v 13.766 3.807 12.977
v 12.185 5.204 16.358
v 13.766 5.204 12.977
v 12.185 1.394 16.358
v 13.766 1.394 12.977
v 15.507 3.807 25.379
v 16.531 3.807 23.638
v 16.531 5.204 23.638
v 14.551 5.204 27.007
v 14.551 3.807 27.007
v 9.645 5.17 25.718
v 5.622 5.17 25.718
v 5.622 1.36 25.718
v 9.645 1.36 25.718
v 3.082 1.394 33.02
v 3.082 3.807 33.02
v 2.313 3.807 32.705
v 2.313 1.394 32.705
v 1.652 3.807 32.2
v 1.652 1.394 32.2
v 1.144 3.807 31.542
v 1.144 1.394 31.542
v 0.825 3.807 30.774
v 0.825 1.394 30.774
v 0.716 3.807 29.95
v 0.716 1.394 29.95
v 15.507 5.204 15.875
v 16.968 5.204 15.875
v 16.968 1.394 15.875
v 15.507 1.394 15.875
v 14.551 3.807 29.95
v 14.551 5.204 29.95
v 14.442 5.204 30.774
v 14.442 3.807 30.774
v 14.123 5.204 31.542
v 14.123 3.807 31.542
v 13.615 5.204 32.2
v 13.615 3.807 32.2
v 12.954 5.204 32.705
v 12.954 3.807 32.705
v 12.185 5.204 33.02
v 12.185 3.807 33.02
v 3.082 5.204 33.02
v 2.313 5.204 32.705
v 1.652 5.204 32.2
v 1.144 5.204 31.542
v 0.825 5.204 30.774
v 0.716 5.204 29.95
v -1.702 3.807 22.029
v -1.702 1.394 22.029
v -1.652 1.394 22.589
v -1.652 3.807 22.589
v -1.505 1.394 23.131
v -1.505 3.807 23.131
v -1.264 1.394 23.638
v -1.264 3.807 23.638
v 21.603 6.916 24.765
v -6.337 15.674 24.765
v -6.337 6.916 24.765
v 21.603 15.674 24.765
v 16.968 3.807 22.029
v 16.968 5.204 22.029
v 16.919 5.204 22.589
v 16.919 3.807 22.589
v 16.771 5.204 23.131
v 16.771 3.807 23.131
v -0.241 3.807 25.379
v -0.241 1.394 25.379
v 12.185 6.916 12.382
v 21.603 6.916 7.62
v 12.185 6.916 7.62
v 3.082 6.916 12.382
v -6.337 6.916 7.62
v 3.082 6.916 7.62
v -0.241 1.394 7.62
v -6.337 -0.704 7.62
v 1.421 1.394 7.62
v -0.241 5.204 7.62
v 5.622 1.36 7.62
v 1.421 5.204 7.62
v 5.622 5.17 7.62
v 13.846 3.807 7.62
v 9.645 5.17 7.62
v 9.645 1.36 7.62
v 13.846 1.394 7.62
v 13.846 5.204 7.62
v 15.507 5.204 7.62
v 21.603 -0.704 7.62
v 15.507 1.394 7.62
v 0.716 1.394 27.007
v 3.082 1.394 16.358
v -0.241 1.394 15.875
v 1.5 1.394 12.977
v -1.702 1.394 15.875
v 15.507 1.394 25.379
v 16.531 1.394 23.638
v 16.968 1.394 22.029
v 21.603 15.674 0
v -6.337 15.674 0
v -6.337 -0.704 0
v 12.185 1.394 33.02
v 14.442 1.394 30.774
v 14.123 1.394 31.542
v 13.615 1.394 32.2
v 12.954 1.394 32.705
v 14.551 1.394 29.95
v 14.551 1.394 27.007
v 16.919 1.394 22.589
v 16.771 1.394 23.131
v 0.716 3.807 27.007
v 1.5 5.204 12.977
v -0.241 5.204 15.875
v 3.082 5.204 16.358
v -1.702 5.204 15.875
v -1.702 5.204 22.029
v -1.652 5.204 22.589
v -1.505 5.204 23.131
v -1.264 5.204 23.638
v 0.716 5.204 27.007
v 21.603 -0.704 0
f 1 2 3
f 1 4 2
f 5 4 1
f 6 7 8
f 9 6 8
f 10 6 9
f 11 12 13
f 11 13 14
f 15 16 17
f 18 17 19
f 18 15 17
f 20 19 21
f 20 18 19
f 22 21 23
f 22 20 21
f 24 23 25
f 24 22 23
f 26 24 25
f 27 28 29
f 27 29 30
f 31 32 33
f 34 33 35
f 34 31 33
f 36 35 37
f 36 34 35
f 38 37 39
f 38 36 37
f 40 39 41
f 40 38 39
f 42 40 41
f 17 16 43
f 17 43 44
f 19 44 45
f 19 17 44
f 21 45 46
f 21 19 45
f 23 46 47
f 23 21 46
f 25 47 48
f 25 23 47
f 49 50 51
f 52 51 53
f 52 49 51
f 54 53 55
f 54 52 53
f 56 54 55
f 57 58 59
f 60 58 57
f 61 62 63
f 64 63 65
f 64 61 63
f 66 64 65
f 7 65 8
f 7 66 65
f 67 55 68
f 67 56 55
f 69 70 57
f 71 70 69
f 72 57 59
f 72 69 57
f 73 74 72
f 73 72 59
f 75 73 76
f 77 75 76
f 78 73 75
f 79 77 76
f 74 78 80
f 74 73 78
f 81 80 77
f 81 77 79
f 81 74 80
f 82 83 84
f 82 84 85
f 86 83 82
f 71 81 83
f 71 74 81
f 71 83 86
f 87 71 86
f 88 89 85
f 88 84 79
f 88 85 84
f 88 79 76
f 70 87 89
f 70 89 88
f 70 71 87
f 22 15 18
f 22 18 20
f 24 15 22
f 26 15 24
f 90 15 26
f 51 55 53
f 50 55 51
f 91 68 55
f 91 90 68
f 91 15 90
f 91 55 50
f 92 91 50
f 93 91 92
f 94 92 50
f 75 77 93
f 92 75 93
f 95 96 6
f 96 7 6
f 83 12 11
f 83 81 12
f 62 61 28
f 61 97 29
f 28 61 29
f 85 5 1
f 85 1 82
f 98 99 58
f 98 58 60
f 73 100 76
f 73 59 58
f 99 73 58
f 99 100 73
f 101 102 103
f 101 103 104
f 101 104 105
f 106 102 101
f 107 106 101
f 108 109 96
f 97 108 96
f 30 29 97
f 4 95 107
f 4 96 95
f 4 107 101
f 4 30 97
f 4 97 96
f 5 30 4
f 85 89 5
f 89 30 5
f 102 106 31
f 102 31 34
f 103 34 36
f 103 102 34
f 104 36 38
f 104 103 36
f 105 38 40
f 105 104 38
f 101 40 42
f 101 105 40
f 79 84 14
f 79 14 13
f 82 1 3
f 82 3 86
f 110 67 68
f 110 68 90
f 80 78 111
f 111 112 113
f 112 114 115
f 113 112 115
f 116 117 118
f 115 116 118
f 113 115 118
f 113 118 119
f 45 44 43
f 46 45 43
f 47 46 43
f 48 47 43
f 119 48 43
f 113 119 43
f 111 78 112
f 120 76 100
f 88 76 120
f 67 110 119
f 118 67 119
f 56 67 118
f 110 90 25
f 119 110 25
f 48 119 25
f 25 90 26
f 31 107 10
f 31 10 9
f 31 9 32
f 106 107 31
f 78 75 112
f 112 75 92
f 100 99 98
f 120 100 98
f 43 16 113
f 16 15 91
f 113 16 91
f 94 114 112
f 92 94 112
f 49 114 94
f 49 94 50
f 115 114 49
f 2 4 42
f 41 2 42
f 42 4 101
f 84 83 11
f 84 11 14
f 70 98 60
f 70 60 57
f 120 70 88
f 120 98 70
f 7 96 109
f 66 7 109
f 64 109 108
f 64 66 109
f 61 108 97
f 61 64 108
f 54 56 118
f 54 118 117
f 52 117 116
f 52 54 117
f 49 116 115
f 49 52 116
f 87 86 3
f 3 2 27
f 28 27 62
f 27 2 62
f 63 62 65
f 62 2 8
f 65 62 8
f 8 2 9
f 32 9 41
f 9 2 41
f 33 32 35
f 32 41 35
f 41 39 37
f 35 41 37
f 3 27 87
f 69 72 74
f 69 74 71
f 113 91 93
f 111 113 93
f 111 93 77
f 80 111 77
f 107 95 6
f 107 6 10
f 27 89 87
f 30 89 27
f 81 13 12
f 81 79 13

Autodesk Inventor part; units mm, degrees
ref_plane "YZ Plane" through (0, 0, 0) normal (1, 0, 0) x (0, 1, 0)
ref_plane "XZ Plane" through (0, 0, 0) normal (0, 1, 0) x (-1, 0, 0)
ref_plane "XY Plane" through (0, 0, 0) normal (0, 0, 1) x (1, 0, 0)
sketch "Sketch1" plane through (0, 0, 0) normal (0, 0, 1) x (1, 0, 0)
  line L0 (-6.3366, 6.9163) -> (21.6034, 6.9163)
  line L1 (21.6034, 6.9163) -> (21.6034, -8.3237)
  line L2 (21.6034, -8.3237) -> (-6.3366, -8.3237)
  line L3 (-6.3366, -8.3237) -> (-6.3366, 6.9163)
  point P0 (0, 0)
  dimension "d0" = 27.94
  dimension "d1" = 15.24
extrude "Extrusion1" add sketch "Sketch1" along normal blind 7.62
sketch "Sketch2" plane through (0, 0, 7.62) normal (0, 0, 1) x (1, 0, 0)
  line L0 (-6.3366, 6.9163) -> (-6.3366, -8.3237) projected
  line L1 (21.6034, -8.3237) -> (21.6034, 6.9163) projected
  line L2 (21.6034, 1.3937) -> (21.6034, 3.8067)
  line L3 (-6.3366, 3.8067) -> (-6.3366, 1.3937)
  line L4 (21.6034, 6.9163) -> (-6.3366, 6.9163) projected
  line L5 (-6.3366, -8.3237) -> (21.6034, -8.3237) projected
  line L6 (0.9631, 3.8067) -> (-0.2406, 3.8067)
  line L7 (-0.2406, 1.3937) -> (0.9631, 1.3937)
  line L8 (-0.2406, 1.3937) -> (-0.2406, 3.8067)
  line L9 (-0.2406, 1.3937) -> (3.0821, 1.3937)
  line L10 (3.0821, 1.3937) -> (3.0821, 3.8067)
  line L11 (3.0821, 3.8067) -> (-0.2406, 3.8067)
  line L12 (-0.2406, 3.8067) -> (-0.2406, 1.3937)
  line L13 (14.3038, 3.8067) -> (15.5074, 3.8067)
  line L14 (15.5074, 1.3937) -> (14.3038, 1.3937)
  line L15 (15.5074, 1.3937) -> (15.5074, 3.8067)
  line L16 (15.5074, 1.3937) -> (12.1847, 1.3937)
  line L17 (12.1847, 1.3937) -> (12.1847, 3.8067)
  line L18 (12.1847, 3.8067) -> (15.5074, 3.8067)
  line L19 (15.5074, 3.8067) -> (15.5074, 1.3937)
  line L20 (-6.3366, -0.7037) -> (21.6034, -0.7037)
  line L21 (-6.3366, 3.8067) -> (21.6034, 3.8067)
  line L22 (21.6034, 3.8067) -> (21.6034, 1.3937)
  line L23 (21.6034, 1.3937) -> (-6.3366, 1.3937)
  line L24 (-6.3366, 1.3937) -> (-6.3366, 3.8067)
  point P0 (0, 0)
  point P1 (-0.2406, 2.6002)
  point P2 (15.2669, 1.0813)
  point P3 (15.5074, 2.6002)
  point P4 (15.5074, 1.3937)
  point P5 (21.6034, 3.8067)
  point P6 (15.5074, 3.8067)
  point P7 (-0.2406, 1.3937)
  point P8 (-0.2406, 3.8067)
  point P9 (-6.3366, 3.8067)
  point P10 (3.0821, 1.3937)
  point P11 (12.1847, 1.3937)
  point P12 (12.1847, 3.8067)
  point P13 (3.0821, 3.8067)
  dimension "d6" = 6.096
extrude "Extrusion2" add sketch "Sketch2" along normal blind 8.7376 contours L6 L11 L10 L9 L7 L8 | L15 L14 L16 L17 L18 L13
sketch "Sketch3" plane through (-0.2406, 3.8067, 7.62) normal (0, 1, 0) x (1, 0, 0)
  line L0 (3.3227, -8.7376) -> (0, -8.7376) projected
  line L1 (-6.096, 7.62) -> (21.844, 7.62) projected
  line L2 (3.3227, -11.3552) -> (3.3227, -8.7376)
  line L3 (12.4253, -11.3552) -> (12.4253, -8.7376)
  line L4 (17.2091, -8.255) -> (17.2091, -15.2732)
  line L5 (17.2091, -15.2732) -> (14.9854, -19.057)
  line L6 (14.9854, -19.057) -> (12.4253, -19.057)
  line L7 (12.4253, -19.057) -> (12.4253, -8.7376)
  line L8 (7.874, 7.62) -> (7.874, -24.8322)
  line L9 (3.3227, -11.3552) -> (3.3227, -8.7376)
  line L10 (-1.4611, -8.255) -> (-1.4611, -15.2732)
  line L11 (-1.4611, -15.2732) -> (0.7626, -19.057)
  line L12 (0.7626, -19.057) -> (3.3227, -19.057)
  line L13 (3.3227, -19.057) -> (3.3227, -8.7376)
  line L14 (17.2091, -8.255) -> (12.4253, -8.255)
  line L15 (12.4253, 0) -> (12.4253, -8.7376) projected
  line L16 (12.4253, -8.255) -> (12.4253, -8.7376)
  line L17 (-1.4611, -8.255) -> (3.3227, -8.255)
  line L18 (3.3227, 0) -> (3.3227, -8.7376) projected
  line L19 (3.3227, -8.255) -> (3.3227, -8.7376)
  point P0 (0.2406, 7.62)
extrude "Extrusion4" add sketch "Sketch2" along normal blind 25.4 contours L6 L11 L10 L9 L7 L8 | L15 L14 L16 L17 L18 L13
sketch "Sketch4" plane through (-6.3366, 6.9163, 0) normal (0, 1, 0) x (1, 0, 0)
  point P0 (6.3366, 0)
sketch "Sketch5" plane through (0, 0, 7.62) normal (0, 0, 1) x (1, 0, 0)
  line L0 (21.6034, 6.9163) -> (-6.3366, 6.9163) projected
  line L1 (-6.3366, 15.6735) -> (21.6034, 15.6735)
  line L2 (21.6034, 15.6735) -> (21.6034, 6.9163)
  line L3 (21.6034, 6.9163) -> (-6.3366, 6.9163)
  line L4 (-6.3366, 6.9163) -> (-6.3366, 15.6735)
  point P0 (0, 0)
extrude "Extrusion5" add sketch "Sketch5" along normal blind 17.145 and the other way blind 7.62
extrude "Extrusion6" cut sketch "Sketch2" against normal blind 25.4 contours L20 L1 L5 L0
extrude "Extrusion7" add sketch "Sketch2" along normal blind 4.7625 contours L21 L8 L23 L0 | L1 L23 L15 L21 | L21 L17 L23 L10
extrude "Extrusion8" add sketch "Sketch3" against normal up to surface (2.413 mm away)
sketch "Sketch6" plane through (-6.3366, 1.3937, 7.62) normal (0, -1, 0) x (1, 0, 0)
  line L0 (27.94, 0) -> (27.94, 4.7625) projected
  line L1 (21.844, 4.7625) -> (21.844, 8.255) projected
  line L2 (27.94, 0) -> (21.844, 0)
  line L3 (21.844, 0) -> (21.844, 4.7625)
  line L4 (21.844, 4.7625) -> (27.94, 4.7625)
  line L5 (27.94, 4.7625) -> (27.94, 0)
  line L6 (18.5213, 4.7625) -> (18.5213, 25.4) projected
  line L7 (18.5213, 4.7625) -> (9.4187, 4.7625)
  line L8 (9.4187, 4.7625) -> (9.4187, 0)
  line L9 (9.4187, 0) -> (18.5213, 0)
  line L10 (18.5213, 0) -> (18.5213, 4.7625)
  line L11 (6.096, 4.7625) -> (6.096, 8.255) projected
  line L12 (0, 0) -> (0, 4.7625) projected
  line L13 (6.096, 4.7625) -> (0, 4.7625)
  line L14 (0, 4.7625) -> (0, 0)
  line L15 (0, 0) -> (6.096, 0)
  line L16 (6.096, 0) -> (6.096, 4.7625)
  point P0 (6.3366, -7.62)
  point P1 (21.844, 8.7376)
  point P2 (18.5213, 19.057)
  point P3 (6.096, 8.7376)
extrude "Extrusion9" cut sketch "Sketch6" against normal up to surface (5.5227 mm away)
sketch "Sketch7" plane through (12.1847, 1.3937, 7.62) normal (0, -1, 0) x (1, 0, 0)
  line L0 (3.3227, 17.7594) -> (4.7838, 15.2732) projected
  line L1 (3.3227, 17.7594) -> (2.3659, 19.3874)
  line L2 (2.3659, 19.3874) -> (2.3659, 25.4)
  line L3 (3.3227, 25.4) -> (0, 25.4) projected
  line L4 (3.3227, 17.7594) -> (3.3227, 25.4) projected
  line L5 (2.3659, 25.4) -> (3.3227, 25.4)
  line L6 (3.3227, 25.4) -> (3.3227, 17.7594)
  line L7 (-18.5213, -7.62) -> (9.4187, -7.62) projected
  line L8 (-12.4253, 17.7594) -> (-11.4685, 19.3874)
  line L9 (-11.4685, 19.3874) -> (-11.4685, 25.4)
  line L10 (-12.4253, 17.7594) -> (-12.4253, 25.4)
  line L11 (-11.4685, 25.4) -> (-12.4253, 25.4)
  line L12 (-12.4253, 25.4) -> (-12.4253, 17.7594)
  line L13 (-12.4253, 8.7376) -> (-13.8865, 8.255) projected
  line L14 (-9.1825, 8.7376) -> (-9.1026, 8.7376)
  line L15 (-9.1026, 0) -> (-9.1026, 25.4) projected
  line L16 (-10.6842, 5.3569) -> (-10.764, 0)
  line L17 (-9.1026, 0) -> (-12.4253, 0) projected
  line L18 (-9.1026, 0) -> (-9.1026, 8.7376)
  line L19 (-10.764, 0) -> (-9.1026, 0)
  line L20 (9.4187, -7.62) -> (-18.5213, -7.62) projected
  line L21 (-18.5213, 17.145) -> (9.4187, 17.145) projected
  line L22 (1.5816, 5.3569) -> (1.6613, 0)
  line L23 (1.6613, 0) -> (0, 0)
  line L24 (0, 0) -> (0, 8.7376)
  line L25 (-4.5513, -7.62) -> (-4.5513, 0)
  line L26 (-4.5513, 11.274) -> (-4.5513, 11.3382)
  line L27 (-9.1026, 8.7376) -> (-10.6842, 5.3569)
  line L28 (0, 8.7376) -> (1.5816, 5.3569)
  point P0 (-12.1847, -7.62)
extrude "Extrusion10" cut sketch "Sketch7" against normal up to surface (5.5227 mm away)
fillet "Fillet1" radius 3.175 4 edges at (0.7162, 2.6002, 33.02) (14.5507, 2.6002, 33.02) (16.9686, 2.6002, 22.8932) (-1.7017, 2.6002, 22.8932)
sketch "Sketch8" plane through (-0.2406, 1.3937, 7.62) normal (0, -1, 0) x (1, 0, 0)
  arc A0 (-1.0234, 16.018) -> (-1.4611, 14.4093) centre (1.7139, 14.4093) ccw projected
  line L0 (-1.4611, 8.255) -> (-1.4611, 14.4093) projected
  line L1 (0, 0) -> (0, 8.255) projected
  line L2 (1.6613, 0) -> (0, 0) projected
  line L3 (1.6613, 0) -> (1.7411, 5.3569) projected
  line L4 (1.7411, 5.3569) -> (3.3227, 8.7376) projected
  line L5 (3.3227, 8.7376) -> (3.3227, 25.4) projected
  arc A1 (3.3227, 25.4) -> (0.9568, 22.3298) centre (4.1318, 22.3298) ccw projected
  line L6 (0.9568, 22.3298) -> (0.9568, 19.3874) projected
  line L7 (0.9568, 19.3874) -> (-1.0234, 16.018) projected
  arc A2 (17.2091, 14.4093) -> (16.7714, 16.018) centre (14.0341, 14.4093) ccw projected
  line L8 (16.7714, 16.018) -> (14.7912, 19.3874) projected
  line L9 (14.7912, 19.3874) -> (14.7912, 22.3298) projected
  arc A3 (14.7912, 22.3298) -> (12.4253, 25.4) centre (11.6162, 22.3298) ccw projected
  line L10 (12.4253, 8.7376) -> (12.4253, 25.4) projected
  line L11 (12.4253, 8.7376) -> (14.0069, 5.3569) projected
  line L12 (14.0069, 5.3569) -> (14.0867, 0) projected
  line L13 (15.748, 0) -> (14.0867, 0) projected
  line L14 (15.748, 0) -> (15.748, 8.255) projected
  line L15 (17.2091, 14.4093) -> (17.2091, 8.255) projected
  line L16 (17.2091, 8.255) -> (15.748, 8.255) projected
  line L17 (0, 8.255) -> (-1.4611, 8.255) projected
  point P0 (0.2406, -7.62)
extrude "Extrusion11" add sketch "Sketch8" against normal blind 3.81
sketch "Sketch9" plane through (0, 0, 7.62) normal (0, 0, 1) x (1, 0, 0)
  line L0 (9.6447, 1.3599) -> (5.6221, 1.3599)
  line L1 (5.6221, 1.3599) -> (5.6221, 5.1699)
  line L2 (5.6221, 5.1699) -> (9.6447, 5.1699)
  line L3 (9.6447, 5.1699) -> (9.6447, 1.3599)
  line L4 (12.1847, 1.3937) -> (12.1847, 5.2037) projected
  line L5 (3.0821, 1.3937) -> (3.0821, 5.2037) projected
  line L6 (1.4208, 1.3937) -> (1.4208, 5.2037) projected
  point P0 (0, 0)
  dimension "d30" = 2.54
  dimension "d31" = 2.54
extrude "Extrusion12" add sketch "Sketch9" along normal blind 18.0975
properties part number "Attachment4"
